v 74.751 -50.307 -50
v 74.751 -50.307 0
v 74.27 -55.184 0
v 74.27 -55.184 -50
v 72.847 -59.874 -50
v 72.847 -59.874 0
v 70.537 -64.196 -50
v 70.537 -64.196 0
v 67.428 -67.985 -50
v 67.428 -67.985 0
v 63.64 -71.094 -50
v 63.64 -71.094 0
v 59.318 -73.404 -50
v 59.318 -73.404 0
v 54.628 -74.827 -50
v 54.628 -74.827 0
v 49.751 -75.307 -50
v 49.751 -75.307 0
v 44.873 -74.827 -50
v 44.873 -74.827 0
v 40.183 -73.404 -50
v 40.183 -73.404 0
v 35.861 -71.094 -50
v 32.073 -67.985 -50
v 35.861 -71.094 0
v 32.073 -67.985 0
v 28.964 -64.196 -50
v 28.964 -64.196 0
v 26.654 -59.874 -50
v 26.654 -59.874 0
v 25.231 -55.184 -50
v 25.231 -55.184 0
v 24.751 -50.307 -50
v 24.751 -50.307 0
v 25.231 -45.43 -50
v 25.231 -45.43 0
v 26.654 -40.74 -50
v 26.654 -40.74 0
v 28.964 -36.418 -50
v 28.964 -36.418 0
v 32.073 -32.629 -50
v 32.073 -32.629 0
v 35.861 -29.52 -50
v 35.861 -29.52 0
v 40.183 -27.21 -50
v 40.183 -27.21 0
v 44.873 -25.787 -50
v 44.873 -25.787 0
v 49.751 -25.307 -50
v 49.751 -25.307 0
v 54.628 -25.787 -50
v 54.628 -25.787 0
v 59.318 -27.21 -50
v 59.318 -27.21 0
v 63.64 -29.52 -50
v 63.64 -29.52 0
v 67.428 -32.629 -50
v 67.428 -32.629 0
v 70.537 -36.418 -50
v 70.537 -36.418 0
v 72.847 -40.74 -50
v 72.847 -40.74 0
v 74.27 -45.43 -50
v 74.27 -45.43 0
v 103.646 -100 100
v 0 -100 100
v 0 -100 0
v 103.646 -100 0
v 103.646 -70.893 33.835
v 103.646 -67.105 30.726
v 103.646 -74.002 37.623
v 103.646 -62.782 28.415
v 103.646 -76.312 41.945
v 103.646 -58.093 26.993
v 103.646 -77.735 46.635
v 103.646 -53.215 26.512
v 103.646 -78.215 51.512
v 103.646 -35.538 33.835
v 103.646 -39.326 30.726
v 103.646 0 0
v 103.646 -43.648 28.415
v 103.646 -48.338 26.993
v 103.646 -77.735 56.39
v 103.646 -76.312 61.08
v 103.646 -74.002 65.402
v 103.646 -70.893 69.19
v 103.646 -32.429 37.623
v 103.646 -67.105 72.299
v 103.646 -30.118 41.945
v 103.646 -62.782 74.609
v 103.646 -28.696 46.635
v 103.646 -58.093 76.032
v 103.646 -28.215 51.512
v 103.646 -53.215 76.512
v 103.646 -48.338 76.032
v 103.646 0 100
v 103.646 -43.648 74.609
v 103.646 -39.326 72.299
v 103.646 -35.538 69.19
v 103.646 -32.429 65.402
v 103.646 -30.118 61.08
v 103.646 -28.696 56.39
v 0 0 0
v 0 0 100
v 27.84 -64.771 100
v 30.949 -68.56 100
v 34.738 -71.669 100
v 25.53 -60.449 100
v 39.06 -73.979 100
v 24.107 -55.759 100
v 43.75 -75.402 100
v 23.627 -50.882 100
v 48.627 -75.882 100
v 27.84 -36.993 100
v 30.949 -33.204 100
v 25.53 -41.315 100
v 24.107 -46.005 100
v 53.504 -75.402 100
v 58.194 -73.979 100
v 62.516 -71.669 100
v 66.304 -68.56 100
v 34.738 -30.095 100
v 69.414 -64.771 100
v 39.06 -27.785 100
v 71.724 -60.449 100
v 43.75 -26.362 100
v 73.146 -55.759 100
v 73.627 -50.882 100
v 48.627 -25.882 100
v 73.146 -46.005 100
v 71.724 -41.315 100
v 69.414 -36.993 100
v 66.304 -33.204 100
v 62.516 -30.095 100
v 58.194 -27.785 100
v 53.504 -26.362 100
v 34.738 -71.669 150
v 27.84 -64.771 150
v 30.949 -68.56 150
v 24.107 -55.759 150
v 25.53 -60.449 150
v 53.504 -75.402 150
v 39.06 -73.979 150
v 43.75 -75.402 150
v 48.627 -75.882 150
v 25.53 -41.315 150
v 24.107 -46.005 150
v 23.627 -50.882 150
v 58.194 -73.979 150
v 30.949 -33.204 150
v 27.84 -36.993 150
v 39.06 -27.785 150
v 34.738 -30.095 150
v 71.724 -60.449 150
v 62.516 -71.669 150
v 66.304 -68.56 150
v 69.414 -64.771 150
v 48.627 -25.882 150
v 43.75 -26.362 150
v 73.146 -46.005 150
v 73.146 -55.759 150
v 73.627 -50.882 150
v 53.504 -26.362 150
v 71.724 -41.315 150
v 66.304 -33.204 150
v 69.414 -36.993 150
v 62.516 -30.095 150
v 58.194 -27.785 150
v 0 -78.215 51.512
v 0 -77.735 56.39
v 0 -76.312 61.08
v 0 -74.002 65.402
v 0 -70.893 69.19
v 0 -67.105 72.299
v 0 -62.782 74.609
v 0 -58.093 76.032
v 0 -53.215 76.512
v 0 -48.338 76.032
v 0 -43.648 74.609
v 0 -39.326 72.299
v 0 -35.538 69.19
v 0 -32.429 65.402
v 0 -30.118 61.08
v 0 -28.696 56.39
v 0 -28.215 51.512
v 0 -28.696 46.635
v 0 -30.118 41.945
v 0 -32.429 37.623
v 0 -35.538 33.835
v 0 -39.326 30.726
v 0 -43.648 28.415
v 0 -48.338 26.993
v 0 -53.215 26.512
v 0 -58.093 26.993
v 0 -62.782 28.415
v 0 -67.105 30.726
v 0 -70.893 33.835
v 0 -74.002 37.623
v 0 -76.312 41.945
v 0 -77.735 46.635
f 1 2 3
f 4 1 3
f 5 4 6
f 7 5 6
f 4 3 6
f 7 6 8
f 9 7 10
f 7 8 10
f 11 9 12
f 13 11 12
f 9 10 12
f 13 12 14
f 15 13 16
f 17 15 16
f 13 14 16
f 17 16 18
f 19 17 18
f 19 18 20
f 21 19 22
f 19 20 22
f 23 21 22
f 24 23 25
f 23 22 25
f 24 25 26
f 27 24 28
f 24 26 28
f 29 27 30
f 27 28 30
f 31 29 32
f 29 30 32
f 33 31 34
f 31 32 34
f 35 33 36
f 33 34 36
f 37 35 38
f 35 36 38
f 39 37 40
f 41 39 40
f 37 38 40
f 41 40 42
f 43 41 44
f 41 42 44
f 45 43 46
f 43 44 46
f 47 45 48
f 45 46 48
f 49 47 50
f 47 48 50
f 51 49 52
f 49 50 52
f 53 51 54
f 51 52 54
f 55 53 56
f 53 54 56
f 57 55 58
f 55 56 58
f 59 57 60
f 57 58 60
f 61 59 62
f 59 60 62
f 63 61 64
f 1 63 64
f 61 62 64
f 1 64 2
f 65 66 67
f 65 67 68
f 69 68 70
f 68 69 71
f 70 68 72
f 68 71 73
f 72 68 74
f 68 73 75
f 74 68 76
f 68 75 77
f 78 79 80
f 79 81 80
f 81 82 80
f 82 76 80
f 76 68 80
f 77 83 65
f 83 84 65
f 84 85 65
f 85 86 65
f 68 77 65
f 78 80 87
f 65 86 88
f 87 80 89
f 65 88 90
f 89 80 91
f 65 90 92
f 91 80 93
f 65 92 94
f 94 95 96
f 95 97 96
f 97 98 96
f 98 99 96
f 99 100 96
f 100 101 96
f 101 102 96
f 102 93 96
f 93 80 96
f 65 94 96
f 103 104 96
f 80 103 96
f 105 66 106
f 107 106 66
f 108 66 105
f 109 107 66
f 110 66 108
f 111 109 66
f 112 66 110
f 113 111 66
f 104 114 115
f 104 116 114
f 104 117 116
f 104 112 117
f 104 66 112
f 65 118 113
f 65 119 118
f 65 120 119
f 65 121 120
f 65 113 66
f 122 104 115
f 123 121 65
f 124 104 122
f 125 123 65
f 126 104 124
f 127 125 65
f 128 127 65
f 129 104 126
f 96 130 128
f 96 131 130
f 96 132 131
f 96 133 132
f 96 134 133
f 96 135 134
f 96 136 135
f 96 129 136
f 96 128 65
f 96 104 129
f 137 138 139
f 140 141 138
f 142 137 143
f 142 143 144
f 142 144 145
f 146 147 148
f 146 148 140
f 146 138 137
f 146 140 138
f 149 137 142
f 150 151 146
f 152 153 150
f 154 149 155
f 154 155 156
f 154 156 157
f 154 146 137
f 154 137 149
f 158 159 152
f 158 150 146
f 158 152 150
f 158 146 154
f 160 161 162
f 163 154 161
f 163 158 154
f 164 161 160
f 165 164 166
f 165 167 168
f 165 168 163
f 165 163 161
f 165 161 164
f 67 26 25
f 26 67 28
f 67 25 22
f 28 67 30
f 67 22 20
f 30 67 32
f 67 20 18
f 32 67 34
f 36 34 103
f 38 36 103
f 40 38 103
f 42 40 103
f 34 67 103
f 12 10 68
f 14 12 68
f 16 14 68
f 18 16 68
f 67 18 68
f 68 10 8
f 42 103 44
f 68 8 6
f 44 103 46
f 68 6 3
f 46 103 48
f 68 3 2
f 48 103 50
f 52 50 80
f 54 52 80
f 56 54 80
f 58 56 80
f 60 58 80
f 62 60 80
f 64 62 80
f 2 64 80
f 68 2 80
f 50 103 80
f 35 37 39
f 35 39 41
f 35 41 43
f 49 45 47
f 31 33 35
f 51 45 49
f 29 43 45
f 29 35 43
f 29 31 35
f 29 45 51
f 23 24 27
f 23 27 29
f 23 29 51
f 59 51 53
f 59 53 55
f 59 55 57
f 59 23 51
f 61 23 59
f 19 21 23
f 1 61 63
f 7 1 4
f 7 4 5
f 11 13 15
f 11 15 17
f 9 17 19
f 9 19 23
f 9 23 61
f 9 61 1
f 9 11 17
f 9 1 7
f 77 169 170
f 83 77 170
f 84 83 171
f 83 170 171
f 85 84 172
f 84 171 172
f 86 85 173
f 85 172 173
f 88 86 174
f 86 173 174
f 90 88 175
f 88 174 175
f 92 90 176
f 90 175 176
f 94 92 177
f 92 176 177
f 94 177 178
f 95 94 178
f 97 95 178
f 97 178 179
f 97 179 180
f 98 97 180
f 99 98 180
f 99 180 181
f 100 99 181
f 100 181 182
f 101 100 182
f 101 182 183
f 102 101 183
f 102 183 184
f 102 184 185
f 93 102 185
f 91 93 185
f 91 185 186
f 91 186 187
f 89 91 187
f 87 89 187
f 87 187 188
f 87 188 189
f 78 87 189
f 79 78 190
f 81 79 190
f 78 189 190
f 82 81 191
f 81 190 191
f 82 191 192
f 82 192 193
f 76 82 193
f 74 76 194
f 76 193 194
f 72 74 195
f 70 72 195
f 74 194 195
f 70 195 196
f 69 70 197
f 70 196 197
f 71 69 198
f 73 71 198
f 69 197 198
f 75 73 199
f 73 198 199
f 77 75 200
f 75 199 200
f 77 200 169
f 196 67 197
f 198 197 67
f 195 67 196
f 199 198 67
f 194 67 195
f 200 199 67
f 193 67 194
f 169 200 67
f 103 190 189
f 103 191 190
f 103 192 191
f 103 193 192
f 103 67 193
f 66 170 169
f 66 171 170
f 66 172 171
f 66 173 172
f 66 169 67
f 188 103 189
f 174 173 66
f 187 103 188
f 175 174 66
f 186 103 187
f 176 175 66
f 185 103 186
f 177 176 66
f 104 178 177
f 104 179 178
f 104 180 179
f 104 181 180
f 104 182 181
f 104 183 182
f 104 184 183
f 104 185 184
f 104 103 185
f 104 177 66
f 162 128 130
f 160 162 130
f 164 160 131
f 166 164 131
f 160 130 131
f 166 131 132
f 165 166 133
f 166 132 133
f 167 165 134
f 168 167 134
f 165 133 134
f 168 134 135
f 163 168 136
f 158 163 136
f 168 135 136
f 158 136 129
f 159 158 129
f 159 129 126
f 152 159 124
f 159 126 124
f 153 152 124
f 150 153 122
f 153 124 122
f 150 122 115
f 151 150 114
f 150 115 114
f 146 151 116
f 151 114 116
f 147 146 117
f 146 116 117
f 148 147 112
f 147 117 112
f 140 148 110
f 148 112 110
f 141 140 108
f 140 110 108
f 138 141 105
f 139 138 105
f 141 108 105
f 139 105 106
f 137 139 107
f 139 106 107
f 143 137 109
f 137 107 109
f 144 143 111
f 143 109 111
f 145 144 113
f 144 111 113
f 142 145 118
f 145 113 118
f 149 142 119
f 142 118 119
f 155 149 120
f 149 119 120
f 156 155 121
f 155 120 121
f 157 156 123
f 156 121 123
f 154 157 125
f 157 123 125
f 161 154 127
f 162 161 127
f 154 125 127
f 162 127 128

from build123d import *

# Parameters (mm, degrees)
F1_W     = 103.645719
F1_H     = 100
F2_DEPTH = 100
F6_D     = 50
F3_R     = 25
F7_DEPTH = 50
F4_R     = 25
F8_DEPTH = 50


with BuildPart() as f2:
    # F1 (on face) → F2 (new body)
    with BuildSketch(Plane.XZ):
        with Locations((51.822859, 50)):
            Rectangle(F1_W, F1_H)
    extrude(amount=F2_DEPTH)

    # F6 (through all)
    with Locations(Plane.YZ.offset(103.645719)):
        with Locations((-53.215325, 51.51242)):
            Hole(F6_D / 2)

    # F3 (on face) → F7 (join)
    with BuildSketch(Plane.XY.offset(100)):
        with Locations((48.626781, -50.881982)):
            Circle(F3_R)
    extrude(amount=F7_DEPTH)

    # F4 (on face) → F8 (join)
    with BuildSketch(Plane(origin=(0, 0, 0), x_dir=(1, 0, 0), z_dir=(0, 0, -1))):
        with Locations((49.750507, 50.30711)):
            Circle(F4_R)
    extrude(amount=F8_DEPTH)


solid = f2.part
